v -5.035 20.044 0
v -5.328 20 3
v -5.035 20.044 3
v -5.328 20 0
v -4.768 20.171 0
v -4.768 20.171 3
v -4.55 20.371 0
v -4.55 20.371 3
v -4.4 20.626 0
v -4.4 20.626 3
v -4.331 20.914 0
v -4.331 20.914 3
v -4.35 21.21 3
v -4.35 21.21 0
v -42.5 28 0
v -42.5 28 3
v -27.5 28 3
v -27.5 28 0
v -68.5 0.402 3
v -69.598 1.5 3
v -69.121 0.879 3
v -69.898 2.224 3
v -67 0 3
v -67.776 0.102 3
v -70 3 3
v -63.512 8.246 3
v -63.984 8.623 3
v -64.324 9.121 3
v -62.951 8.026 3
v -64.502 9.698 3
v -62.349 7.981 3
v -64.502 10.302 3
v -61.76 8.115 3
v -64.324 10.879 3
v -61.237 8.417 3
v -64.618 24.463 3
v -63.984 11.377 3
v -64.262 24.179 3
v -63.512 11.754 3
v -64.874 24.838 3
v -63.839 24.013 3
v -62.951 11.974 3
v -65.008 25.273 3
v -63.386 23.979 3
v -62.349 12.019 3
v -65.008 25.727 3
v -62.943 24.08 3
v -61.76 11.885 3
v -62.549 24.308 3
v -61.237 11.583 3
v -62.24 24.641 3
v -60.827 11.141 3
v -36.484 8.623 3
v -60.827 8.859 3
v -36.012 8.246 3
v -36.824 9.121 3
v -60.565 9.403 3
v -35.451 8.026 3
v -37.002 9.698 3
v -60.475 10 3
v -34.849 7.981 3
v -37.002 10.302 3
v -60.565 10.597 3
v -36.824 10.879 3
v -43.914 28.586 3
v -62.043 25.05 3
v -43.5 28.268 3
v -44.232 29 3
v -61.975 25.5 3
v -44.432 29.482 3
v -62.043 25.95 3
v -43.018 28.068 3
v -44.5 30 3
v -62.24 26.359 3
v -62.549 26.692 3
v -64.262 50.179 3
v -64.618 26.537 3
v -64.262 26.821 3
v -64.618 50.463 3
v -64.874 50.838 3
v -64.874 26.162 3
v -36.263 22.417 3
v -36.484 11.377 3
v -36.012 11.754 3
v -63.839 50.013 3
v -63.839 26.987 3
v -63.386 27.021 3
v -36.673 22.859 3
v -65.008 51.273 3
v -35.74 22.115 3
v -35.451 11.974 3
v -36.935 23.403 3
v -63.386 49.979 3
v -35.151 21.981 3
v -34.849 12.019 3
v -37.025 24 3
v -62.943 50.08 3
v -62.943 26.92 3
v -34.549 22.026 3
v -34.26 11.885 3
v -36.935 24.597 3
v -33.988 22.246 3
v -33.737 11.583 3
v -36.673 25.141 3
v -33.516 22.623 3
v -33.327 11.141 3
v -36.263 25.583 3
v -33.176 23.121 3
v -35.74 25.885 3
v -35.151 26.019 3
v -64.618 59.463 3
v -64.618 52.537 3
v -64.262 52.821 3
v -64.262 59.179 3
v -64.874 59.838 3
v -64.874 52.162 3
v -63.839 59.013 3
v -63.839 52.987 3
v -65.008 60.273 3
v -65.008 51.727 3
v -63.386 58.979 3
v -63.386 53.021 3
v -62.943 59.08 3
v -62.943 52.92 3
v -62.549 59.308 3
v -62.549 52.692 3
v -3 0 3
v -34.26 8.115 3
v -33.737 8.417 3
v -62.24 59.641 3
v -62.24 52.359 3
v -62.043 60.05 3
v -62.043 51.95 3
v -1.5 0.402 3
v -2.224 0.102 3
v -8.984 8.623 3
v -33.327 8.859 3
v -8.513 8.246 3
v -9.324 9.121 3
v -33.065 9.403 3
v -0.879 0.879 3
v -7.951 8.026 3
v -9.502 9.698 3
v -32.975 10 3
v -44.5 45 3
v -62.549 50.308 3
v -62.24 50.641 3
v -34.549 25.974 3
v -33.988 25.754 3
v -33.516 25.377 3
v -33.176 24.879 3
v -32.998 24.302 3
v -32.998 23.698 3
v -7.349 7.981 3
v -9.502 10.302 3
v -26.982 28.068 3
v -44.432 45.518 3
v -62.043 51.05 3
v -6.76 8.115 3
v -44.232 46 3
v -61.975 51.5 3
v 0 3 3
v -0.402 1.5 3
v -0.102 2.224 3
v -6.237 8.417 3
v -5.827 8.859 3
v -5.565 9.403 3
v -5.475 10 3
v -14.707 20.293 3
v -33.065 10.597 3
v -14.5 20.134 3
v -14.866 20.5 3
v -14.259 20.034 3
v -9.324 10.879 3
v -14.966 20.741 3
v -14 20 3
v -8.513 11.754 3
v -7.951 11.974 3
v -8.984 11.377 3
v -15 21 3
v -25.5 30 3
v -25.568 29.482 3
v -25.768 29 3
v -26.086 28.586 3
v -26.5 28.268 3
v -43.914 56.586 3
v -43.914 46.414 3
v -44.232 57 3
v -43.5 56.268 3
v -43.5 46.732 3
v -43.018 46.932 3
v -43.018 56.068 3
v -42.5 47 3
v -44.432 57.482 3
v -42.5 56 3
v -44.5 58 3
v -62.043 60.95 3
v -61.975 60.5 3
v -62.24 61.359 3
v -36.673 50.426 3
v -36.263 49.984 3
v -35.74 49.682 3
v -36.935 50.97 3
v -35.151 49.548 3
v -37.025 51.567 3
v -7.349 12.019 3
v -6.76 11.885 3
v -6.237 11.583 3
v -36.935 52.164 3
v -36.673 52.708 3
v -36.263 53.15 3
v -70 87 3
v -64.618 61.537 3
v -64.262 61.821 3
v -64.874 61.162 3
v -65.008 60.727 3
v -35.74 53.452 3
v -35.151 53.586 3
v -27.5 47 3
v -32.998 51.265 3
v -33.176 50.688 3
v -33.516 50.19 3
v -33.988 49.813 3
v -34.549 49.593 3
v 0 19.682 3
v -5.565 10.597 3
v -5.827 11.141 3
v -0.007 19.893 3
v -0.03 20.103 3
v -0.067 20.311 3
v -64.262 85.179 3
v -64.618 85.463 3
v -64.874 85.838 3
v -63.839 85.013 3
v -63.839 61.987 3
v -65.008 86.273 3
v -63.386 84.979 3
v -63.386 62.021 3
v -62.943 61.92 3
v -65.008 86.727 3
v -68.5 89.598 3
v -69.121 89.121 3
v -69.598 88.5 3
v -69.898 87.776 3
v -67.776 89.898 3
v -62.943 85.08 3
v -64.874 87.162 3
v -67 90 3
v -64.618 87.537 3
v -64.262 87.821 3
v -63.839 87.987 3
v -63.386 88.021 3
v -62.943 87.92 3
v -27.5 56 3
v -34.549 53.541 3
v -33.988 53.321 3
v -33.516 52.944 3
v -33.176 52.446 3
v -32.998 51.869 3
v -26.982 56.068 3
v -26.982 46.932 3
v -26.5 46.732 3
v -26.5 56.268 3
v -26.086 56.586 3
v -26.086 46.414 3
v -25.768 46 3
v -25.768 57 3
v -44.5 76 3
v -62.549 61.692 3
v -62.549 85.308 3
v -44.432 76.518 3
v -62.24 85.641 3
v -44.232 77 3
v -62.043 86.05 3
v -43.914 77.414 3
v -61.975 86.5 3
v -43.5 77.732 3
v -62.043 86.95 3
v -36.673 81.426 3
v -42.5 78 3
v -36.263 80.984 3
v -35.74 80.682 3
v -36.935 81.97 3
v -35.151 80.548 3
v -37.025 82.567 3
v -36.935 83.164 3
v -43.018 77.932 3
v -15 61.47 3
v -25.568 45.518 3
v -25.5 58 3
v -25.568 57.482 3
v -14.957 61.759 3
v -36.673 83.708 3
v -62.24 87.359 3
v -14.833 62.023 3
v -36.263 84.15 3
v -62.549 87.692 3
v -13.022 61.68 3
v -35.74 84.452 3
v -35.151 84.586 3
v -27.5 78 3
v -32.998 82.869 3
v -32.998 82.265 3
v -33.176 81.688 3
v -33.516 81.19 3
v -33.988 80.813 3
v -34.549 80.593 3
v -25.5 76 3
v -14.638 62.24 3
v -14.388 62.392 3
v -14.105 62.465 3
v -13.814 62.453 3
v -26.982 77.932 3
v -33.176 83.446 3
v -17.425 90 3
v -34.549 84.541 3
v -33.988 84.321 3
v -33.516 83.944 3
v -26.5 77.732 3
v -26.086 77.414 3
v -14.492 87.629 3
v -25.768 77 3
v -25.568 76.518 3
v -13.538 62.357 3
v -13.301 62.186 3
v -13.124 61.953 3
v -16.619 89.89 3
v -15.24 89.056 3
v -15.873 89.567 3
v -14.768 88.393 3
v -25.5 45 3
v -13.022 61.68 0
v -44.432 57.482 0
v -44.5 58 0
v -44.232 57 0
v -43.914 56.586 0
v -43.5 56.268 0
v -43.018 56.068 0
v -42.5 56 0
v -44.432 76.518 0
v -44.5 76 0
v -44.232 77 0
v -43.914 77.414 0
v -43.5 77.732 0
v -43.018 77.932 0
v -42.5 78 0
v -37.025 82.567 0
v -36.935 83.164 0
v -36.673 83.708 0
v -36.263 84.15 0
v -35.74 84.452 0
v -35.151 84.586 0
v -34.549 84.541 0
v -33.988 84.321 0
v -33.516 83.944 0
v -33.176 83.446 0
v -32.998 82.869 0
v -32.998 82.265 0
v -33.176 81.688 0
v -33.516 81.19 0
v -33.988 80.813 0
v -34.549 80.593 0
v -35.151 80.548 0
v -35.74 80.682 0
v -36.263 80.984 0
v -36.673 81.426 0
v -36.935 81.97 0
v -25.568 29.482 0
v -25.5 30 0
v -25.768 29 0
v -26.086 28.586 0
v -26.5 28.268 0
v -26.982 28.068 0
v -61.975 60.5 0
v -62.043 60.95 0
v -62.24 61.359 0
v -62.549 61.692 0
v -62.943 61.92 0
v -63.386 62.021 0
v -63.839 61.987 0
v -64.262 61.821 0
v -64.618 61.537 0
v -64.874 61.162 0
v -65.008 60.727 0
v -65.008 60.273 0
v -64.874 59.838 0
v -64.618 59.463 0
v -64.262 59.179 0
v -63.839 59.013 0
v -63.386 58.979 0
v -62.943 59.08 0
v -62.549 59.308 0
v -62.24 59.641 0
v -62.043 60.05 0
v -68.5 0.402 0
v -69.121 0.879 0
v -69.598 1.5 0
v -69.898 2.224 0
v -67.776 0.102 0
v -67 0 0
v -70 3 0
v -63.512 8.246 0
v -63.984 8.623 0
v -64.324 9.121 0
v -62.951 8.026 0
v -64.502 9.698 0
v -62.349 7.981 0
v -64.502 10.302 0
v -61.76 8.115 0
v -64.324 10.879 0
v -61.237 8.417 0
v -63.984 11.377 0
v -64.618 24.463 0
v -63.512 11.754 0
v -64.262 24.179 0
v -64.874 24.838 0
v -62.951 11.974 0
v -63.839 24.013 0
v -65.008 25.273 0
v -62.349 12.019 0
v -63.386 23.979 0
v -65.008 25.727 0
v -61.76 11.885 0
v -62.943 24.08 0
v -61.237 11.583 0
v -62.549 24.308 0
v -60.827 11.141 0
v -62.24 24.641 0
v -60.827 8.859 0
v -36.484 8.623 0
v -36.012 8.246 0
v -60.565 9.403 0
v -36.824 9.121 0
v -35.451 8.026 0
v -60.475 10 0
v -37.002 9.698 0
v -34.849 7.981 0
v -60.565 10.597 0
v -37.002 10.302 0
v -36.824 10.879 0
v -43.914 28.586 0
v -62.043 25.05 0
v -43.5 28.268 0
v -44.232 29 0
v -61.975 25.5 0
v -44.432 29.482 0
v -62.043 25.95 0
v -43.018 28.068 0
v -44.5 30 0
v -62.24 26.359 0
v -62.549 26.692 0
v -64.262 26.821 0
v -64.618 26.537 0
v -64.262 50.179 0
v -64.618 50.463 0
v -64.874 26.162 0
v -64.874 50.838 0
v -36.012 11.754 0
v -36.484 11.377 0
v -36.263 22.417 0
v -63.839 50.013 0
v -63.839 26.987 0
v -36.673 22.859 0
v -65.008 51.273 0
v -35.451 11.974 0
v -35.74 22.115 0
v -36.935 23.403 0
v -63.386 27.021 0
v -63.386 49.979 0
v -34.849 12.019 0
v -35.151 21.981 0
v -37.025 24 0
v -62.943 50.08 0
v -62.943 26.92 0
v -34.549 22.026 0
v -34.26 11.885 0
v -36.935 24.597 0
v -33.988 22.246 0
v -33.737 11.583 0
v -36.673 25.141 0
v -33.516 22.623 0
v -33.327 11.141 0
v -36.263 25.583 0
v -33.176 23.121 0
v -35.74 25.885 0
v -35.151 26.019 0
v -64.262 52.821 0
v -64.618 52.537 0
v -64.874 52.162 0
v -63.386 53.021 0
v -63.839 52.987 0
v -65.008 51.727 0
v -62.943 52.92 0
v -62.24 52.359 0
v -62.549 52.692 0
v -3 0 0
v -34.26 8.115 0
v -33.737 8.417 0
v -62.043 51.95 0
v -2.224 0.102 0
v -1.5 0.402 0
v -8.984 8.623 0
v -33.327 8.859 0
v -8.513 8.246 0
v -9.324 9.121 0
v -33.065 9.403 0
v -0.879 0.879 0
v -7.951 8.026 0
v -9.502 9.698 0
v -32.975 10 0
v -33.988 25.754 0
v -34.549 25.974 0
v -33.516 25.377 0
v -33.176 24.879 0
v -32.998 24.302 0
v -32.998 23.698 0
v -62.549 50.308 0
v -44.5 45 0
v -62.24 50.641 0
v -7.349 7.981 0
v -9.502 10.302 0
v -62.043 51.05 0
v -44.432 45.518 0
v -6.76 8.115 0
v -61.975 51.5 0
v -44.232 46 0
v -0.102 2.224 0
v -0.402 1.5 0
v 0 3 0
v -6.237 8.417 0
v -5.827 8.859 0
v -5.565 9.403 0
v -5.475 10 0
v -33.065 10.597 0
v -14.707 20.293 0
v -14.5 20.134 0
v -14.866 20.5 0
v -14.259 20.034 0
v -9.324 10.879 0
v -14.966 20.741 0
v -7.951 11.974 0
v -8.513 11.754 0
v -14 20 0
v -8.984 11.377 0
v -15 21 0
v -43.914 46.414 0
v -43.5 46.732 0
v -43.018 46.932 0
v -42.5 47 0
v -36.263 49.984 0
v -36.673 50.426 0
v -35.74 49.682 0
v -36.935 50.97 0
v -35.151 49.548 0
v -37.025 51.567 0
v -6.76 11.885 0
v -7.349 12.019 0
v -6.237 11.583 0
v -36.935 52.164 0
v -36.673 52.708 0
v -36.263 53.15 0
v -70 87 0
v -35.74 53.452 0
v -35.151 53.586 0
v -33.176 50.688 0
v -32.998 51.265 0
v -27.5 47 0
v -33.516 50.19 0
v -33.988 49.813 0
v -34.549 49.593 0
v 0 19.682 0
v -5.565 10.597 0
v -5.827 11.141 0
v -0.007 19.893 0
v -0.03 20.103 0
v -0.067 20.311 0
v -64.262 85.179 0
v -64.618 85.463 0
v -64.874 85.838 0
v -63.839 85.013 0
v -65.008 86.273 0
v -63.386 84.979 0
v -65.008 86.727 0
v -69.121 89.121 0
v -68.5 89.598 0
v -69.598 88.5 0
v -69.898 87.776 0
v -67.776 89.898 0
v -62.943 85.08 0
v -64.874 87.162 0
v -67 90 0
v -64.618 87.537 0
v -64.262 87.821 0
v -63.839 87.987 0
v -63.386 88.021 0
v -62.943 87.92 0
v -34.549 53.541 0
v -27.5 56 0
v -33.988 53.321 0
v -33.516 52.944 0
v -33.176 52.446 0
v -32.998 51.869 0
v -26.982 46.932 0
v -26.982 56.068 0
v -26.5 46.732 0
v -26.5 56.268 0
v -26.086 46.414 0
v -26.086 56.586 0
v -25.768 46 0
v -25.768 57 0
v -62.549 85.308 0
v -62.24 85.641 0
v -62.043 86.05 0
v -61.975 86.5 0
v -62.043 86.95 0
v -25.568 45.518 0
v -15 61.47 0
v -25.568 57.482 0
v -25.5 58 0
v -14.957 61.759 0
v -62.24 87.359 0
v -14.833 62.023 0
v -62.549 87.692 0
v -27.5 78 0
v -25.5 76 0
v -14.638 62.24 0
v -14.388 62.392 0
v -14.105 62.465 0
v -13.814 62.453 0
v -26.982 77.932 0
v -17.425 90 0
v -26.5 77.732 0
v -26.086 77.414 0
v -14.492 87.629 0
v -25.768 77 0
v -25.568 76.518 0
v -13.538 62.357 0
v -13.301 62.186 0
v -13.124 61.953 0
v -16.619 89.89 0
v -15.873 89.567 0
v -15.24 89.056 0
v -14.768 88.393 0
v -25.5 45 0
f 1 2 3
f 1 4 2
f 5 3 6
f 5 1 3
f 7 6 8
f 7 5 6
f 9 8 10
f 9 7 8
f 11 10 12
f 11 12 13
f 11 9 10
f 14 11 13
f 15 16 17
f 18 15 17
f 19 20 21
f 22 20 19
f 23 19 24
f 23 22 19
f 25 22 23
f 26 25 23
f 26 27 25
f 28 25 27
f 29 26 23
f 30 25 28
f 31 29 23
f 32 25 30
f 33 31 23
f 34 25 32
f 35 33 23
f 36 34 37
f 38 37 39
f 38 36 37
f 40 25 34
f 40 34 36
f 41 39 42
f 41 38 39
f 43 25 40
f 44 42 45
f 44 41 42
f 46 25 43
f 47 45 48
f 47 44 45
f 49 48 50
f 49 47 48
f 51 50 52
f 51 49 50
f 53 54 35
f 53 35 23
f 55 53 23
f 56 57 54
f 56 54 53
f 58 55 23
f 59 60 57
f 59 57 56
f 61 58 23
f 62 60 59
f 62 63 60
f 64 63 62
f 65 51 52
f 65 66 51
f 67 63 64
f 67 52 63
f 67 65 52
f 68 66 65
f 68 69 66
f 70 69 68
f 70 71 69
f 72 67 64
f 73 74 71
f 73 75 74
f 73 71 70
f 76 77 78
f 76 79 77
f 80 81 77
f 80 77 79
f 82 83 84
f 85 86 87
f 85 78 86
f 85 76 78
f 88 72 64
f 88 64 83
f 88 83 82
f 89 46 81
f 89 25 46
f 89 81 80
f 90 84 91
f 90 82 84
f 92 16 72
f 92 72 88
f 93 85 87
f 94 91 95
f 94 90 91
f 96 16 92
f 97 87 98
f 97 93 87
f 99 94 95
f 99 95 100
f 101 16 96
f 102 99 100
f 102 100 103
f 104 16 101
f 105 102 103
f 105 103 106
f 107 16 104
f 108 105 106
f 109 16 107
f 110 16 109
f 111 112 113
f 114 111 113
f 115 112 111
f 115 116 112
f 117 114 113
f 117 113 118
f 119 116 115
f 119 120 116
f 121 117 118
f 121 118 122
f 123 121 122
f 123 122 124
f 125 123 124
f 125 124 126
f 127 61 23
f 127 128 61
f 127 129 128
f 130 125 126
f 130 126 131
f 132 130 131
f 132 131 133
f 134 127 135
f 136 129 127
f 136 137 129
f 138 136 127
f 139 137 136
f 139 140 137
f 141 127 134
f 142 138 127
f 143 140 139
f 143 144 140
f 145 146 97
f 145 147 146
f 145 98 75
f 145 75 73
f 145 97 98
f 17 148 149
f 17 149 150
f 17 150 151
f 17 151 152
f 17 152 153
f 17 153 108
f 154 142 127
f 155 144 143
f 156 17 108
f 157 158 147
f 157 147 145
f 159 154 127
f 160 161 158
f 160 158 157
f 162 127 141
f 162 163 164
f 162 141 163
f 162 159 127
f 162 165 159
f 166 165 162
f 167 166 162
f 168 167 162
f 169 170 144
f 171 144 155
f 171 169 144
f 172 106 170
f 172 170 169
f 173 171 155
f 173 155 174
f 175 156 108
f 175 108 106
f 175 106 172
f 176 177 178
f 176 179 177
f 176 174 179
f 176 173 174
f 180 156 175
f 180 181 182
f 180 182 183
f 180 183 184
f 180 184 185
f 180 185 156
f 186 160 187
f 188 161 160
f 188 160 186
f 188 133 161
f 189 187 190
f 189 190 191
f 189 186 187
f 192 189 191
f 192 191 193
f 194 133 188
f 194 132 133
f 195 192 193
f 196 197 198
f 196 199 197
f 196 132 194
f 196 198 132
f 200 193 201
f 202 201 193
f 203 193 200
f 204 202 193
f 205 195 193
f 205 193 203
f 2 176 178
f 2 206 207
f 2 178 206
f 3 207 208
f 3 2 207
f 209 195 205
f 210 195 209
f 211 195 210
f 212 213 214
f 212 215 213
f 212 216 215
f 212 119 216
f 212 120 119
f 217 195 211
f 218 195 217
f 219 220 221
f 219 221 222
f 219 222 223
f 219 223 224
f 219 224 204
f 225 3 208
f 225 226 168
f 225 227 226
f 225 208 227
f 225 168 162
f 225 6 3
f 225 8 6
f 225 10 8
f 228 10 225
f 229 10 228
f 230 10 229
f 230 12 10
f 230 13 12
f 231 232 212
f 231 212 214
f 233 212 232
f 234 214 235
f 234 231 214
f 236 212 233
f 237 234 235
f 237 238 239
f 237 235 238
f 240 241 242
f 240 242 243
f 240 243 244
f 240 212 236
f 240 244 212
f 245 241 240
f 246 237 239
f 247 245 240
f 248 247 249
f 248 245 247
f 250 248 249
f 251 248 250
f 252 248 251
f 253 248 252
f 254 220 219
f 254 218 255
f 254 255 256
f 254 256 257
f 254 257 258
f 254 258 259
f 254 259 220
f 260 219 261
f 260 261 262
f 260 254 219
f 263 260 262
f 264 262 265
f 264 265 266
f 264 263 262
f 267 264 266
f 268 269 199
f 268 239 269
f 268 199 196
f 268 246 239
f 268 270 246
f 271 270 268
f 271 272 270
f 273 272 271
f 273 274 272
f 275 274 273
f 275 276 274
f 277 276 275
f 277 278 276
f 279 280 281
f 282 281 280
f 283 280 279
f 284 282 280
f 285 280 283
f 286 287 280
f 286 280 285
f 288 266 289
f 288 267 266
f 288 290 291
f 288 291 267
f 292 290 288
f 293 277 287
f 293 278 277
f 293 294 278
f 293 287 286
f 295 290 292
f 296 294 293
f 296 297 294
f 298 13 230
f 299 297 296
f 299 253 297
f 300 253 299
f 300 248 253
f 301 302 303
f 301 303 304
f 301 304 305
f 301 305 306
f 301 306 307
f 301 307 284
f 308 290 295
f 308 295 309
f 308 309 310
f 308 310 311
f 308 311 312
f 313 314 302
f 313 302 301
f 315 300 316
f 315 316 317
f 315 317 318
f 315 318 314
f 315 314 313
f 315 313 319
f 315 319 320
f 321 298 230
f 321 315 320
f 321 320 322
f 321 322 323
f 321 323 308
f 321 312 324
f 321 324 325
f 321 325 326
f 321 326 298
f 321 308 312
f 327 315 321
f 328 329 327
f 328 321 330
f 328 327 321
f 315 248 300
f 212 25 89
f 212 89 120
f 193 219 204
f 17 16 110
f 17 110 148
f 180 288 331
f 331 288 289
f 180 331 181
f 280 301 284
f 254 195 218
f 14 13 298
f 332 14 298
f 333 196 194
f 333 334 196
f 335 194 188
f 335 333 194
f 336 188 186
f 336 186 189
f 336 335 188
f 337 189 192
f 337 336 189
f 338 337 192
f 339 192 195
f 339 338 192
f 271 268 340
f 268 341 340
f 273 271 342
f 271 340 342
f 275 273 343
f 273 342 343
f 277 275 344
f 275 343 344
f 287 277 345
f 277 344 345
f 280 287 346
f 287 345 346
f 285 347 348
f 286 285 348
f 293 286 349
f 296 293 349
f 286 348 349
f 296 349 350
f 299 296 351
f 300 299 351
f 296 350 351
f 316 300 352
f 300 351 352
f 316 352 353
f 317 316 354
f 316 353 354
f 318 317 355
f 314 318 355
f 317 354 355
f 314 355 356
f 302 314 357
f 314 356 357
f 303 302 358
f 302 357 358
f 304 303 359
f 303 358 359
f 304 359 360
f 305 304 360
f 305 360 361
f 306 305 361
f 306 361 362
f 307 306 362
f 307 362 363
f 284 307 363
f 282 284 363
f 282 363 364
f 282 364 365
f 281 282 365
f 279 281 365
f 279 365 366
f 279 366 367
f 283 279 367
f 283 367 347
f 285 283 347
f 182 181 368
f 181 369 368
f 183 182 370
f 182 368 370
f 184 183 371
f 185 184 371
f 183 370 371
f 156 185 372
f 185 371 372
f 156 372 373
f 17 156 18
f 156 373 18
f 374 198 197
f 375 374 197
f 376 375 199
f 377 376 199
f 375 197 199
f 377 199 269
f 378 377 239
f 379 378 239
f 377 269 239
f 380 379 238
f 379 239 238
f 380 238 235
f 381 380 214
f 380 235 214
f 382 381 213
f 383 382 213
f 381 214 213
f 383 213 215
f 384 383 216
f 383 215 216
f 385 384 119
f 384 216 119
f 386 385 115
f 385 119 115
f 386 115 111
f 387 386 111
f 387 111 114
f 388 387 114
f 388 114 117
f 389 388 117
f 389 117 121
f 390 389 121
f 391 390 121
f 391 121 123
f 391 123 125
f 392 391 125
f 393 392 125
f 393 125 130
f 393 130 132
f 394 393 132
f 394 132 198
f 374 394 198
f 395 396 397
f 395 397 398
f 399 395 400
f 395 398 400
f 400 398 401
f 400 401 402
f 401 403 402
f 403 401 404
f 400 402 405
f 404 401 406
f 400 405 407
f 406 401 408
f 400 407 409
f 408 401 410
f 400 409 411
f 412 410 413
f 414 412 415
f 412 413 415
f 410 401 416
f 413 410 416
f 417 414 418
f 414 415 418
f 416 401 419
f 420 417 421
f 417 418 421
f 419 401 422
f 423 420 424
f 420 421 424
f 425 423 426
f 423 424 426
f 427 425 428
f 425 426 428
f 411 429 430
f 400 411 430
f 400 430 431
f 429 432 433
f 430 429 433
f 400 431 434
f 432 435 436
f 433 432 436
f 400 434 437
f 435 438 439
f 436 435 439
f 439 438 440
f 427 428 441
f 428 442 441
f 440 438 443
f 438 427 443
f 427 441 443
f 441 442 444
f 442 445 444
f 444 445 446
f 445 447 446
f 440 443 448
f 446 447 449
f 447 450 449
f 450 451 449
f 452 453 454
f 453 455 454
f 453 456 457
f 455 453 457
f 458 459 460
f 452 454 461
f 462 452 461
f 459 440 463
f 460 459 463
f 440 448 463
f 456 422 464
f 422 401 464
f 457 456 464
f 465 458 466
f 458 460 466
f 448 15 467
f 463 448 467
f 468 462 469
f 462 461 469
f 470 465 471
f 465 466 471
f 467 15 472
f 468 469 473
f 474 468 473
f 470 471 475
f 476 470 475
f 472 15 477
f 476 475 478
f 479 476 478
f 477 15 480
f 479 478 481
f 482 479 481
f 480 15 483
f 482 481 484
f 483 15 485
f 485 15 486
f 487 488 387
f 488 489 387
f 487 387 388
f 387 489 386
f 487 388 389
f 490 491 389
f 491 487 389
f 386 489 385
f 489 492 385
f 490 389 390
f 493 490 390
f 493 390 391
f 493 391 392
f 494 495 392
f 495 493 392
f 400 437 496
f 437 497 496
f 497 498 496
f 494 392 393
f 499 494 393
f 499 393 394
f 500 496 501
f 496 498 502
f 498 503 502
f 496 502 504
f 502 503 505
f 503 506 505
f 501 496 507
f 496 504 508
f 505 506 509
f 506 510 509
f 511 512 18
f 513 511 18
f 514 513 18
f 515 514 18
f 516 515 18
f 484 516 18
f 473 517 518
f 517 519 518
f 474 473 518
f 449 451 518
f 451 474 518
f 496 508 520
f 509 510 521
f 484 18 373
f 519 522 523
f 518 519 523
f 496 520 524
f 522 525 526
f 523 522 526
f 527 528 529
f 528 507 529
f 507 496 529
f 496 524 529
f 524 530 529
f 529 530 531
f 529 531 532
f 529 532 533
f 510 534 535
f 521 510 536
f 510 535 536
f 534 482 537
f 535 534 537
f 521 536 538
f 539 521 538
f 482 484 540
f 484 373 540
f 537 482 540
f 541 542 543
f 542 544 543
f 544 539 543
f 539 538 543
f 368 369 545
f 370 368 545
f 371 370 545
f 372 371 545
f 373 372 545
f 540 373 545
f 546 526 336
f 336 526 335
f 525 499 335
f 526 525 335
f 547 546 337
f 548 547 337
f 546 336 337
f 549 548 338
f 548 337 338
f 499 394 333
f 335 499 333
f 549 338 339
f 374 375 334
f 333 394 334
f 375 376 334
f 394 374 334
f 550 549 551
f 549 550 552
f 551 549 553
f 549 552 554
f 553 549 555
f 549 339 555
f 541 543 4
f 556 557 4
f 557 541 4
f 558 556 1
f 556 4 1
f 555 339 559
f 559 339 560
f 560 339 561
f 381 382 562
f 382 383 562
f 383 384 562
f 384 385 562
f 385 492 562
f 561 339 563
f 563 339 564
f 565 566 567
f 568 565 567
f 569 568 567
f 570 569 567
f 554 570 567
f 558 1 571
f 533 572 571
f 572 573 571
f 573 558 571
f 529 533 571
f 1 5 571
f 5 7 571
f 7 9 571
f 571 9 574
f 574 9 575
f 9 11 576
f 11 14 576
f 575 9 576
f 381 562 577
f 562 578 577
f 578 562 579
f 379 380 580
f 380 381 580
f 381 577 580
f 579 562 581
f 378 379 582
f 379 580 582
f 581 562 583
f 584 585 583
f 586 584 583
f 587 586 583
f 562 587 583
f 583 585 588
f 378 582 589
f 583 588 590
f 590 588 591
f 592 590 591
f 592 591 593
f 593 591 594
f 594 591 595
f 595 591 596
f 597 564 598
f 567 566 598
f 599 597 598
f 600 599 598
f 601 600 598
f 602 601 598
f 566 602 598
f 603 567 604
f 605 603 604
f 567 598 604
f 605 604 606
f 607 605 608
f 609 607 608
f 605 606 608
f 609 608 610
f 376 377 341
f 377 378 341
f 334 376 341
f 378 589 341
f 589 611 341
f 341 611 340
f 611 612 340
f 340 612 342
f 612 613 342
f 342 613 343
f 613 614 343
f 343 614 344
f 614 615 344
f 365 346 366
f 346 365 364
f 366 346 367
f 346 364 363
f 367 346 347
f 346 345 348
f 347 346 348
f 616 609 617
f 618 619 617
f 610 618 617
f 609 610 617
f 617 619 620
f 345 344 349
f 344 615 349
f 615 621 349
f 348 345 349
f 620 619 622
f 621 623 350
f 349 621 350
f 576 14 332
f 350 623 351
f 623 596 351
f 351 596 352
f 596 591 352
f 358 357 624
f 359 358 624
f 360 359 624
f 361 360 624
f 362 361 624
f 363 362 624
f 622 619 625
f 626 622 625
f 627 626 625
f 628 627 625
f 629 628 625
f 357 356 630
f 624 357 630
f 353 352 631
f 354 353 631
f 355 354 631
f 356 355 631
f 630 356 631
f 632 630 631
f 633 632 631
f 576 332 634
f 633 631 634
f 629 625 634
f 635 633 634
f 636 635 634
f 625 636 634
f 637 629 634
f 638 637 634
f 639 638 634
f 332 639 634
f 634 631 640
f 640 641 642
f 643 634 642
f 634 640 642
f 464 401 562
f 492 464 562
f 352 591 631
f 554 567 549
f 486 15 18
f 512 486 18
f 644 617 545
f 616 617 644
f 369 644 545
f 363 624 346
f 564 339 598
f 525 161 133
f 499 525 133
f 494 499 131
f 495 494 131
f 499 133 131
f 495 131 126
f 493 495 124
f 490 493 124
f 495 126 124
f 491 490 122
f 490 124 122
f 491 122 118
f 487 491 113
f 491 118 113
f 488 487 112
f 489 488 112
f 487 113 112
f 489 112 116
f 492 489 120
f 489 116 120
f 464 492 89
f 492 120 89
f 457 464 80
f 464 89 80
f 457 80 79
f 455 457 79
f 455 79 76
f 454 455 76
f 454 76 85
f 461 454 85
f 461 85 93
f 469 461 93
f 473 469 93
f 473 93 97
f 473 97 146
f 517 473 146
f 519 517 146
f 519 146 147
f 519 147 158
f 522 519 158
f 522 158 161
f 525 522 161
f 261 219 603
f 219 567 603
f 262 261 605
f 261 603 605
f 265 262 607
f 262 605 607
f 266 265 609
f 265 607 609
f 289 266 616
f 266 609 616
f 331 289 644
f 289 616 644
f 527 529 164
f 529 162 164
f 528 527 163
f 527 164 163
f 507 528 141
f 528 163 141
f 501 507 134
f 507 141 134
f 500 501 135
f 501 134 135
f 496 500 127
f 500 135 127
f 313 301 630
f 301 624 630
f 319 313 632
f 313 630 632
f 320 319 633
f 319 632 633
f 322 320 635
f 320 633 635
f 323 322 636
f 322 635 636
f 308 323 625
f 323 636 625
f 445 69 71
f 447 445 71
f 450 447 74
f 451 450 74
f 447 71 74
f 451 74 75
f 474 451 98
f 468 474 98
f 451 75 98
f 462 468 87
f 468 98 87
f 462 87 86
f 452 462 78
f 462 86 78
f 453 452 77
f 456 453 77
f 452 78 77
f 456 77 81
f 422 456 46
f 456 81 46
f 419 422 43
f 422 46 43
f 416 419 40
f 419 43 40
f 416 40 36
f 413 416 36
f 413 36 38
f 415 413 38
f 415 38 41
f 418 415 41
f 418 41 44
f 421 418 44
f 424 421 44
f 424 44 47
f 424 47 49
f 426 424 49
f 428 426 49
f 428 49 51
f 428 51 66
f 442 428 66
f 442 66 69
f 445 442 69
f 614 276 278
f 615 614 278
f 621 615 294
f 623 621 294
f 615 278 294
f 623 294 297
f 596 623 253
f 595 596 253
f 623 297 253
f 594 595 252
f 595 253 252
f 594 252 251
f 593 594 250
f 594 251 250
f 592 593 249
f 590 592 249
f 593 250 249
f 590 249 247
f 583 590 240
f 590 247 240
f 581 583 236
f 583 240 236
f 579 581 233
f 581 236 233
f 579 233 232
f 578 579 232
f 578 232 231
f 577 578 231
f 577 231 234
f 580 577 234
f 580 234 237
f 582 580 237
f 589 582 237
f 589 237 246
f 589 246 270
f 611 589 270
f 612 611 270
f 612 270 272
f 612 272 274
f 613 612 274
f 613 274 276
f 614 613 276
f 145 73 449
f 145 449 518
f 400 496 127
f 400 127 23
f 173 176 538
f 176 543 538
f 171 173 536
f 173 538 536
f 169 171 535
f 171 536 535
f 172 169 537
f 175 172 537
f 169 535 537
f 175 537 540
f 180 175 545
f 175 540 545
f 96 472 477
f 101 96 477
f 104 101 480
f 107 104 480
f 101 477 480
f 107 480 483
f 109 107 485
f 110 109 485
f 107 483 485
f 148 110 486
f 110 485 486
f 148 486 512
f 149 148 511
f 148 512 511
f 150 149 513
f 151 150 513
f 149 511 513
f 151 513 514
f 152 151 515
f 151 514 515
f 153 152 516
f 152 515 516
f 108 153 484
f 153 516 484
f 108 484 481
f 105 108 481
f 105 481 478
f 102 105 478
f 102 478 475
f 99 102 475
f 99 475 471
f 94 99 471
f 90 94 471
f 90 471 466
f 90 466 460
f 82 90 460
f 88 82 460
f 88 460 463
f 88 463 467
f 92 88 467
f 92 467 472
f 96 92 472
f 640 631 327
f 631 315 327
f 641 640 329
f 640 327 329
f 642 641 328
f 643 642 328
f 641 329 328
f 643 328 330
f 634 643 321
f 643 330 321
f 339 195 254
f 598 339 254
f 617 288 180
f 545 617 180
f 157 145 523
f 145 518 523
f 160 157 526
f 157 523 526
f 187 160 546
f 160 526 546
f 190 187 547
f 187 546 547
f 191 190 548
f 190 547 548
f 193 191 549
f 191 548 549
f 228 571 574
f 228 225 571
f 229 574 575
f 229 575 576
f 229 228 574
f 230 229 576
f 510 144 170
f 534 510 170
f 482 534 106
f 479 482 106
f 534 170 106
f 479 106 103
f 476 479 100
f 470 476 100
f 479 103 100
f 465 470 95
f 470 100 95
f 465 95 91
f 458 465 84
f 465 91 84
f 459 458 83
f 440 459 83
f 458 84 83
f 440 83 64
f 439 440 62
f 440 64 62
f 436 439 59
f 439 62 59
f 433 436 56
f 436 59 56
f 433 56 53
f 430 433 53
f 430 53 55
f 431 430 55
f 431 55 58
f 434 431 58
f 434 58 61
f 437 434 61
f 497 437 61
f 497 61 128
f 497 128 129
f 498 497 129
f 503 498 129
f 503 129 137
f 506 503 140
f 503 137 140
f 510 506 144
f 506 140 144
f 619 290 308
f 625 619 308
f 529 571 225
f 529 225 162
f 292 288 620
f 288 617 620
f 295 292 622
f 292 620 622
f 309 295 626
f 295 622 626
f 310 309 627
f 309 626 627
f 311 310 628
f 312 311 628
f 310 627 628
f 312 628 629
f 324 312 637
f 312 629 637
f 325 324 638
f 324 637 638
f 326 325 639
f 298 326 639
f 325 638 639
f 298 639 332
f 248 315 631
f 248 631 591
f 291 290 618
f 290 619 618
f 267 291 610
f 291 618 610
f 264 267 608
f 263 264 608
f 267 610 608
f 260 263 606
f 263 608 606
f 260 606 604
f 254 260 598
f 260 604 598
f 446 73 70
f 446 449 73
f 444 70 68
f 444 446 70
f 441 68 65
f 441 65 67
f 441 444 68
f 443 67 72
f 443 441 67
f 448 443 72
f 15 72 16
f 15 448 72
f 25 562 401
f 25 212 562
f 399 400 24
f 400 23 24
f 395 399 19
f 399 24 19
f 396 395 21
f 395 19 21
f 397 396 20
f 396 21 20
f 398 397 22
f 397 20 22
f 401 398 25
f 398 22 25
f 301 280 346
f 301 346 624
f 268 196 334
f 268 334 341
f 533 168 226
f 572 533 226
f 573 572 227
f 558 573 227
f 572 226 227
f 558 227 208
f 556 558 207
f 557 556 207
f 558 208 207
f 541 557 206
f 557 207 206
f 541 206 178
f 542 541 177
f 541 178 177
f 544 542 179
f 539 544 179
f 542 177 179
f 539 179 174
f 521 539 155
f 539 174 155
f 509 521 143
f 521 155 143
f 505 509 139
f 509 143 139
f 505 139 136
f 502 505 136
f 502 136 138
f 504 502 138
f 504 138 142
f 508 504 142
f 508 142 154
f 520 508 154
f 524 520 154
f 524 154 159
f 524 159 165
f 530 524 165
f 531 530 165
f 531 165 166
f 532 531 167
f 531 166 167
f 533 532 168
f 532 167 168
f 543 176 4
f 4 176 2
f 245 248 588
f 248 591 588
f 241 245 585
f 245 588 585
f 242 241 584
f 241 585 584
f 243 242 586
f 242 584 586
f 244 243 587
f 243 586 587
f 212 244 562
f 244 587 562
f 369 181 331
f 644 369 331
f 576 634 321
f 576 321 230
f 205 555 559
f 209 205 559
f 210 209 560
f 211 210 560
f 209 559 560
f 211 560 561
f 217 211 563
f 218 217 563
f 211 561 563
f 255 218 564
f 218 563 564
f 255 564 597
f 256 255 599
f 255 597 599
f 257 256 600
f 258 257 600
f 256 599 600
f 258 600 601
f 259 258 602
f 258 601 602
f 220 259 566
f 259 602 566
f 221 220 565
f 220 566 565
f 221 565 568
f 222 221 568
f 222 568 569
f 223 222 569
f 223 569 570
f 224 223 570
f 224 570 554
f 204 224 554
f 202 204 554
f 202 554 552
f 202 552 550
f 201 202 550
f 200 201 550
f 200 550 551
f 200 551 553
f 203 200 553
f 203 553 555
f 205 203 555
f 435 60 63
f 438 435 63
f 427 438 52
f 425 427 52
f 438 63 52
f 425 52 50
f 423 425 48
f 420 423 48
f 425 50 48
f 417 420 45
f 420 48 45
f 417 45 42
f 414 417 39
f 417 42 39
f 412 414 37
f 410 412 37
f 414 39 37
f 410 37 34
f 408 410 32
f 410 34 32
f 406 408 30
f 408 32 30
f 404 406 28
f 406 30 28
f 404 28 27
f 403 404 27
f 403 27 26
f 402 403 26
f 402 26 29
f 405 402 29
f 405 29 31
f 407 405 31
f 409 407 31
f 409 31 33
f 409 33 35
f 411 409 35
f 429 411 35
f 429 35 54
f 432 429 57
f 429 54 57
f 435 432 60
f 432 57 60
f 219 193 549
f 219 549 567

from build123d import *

# Parameters (mm, degrees)
EXTRUDE_1_DEPTH          = 3
SKETCH_3_W               = 19
SKETCH_3_H               = 22
SKETCH_3_H_2             = 19
CUT_EXTRUDE_1_DEPTH      = 3
FILLET_1_R               = 1
FILLET_2_R               = 2
SKETCH_4_R               = 2.025
CUT_EXTRUDE_2_DEPTH      = 3
SKETCH_5_R               = 2.025
CUT_EXTRUDE_3_DEPTH      = 10
EXTRUDE_2_DEPTH          = 3
FILLET_3_R               = 3
SKETCH_8_R               = 1.525
CUT_EXTRUDE_4_DEPTH      = 1
CUT_EXTRUDE_4_DEPTH_BACK = 4


with BuildPart() as part:
    # 草图1 → 凸台-拉伸1 (new body)
    with BuildSketch(Plane.XY):
        Polygon((0, 0), (-70, 0), (-70, 20), (-55, 90), (-15, 90), (0, 20), align=None)
    extrude(amount=EXTRUDE_1_DEPTH)

    # 草图3 → 切除-拉伸1 (cut)
    with BuildSketch(Plane.XY.offset(3)):
        with Locations((-35, 67)):
            Rectangle(SKETCH_3_W, SKETCH_3_H)
        with Locations((-35, 37.5)):
            Rectangle(SKETCH_3_W, SKETCH_3_H_2)
        Polygon((-4.090806018, 20), (-15, 70.909571916), (-15, 20), align=None)
    extrude(amount=-CUT_EXTRUDE_1_DEPTH, mode=Mode.SUBTRACT)

    # 圆角1
    fillet_1_edges = [part.edges().sort_by_distance(p)[0] for p in [
        (-4.090806018, 20, 1.5),
        (-15, 20, 1.5),
        (-15, 70.909571916, 1.5),
    ]]
    fillet(fillet_1_edges, radius=FILLET_1_R)

    # 圆角2
    fillet_2_edges = [part.edges().sort_by_distance(p)[0] for p in [
        (-25.5, 47, 1.5),
        (-25.5, 28, 1.5),
        (-44.5, 28, 1.5),
        (-44.5, 47, 1.5),
        (-25.5, 78, 1.5),
        (-25.5, 56, 1.5),
        (-44.5, 56, 1.5),
        (-44.5, 78, 1.5),
    ]]
    fillet(fillet_2_edges, radius=FILLET_2_R)

    # 草图4 → 切除-拉伸2 (cut)
    with BuildSketch(Plane.XY.offset(3)):
        with Locations((-62.5, 10)):
            Circle(SKETCH_4_R)
        with Locations((-35, 10)):
            Circle(SKETCH_4_R)
        with Locations((-7.5, 10)):
            Circle(SKETCH_4_R)
    extrude(amount=-CUT_EXTRUDE_2_DEPTH, mode=Mode.SUBTRACT)

    # 草图5 → 切除-拉伸3 (cut)
    with BuildSketch(Plane(origin=(0, 0, 0), x_dir=(-1, 0, 0), z_dir=(0, 0, -1))):
        with Locations((35, 82.566965626)):
            Circle(SKETCH_5_R)
        with Locations((35, 51.566965626)):
            Circle(SKETCH_5_R)
        with Locations((35, 24)):
            Circle(SKETCH_5_R)
    extrude(amount=-CUT_EXTRUDE_3_DEPTH, mode=Mode.SUBTRACT)

    # 草图7 → 凸台-拉伸2 (add)
    with BuildSketch(Plane.XY.offset(3)):
        Polygon((-55, 90), (-70, 90), (-70, 20), align=None)
    extrude(amount=-EXTRUDE_2_DEPTH)

    # 圆角3
    fillet_3_edges = [part.edges().sort_by_distance(p)[0] for p in [
        (0, 0, 1.5),
        (-70, 0, 1.5),
        (-15, 90, 1.5),
        (0, 20, 1.5),
        (-70, 90, 1.5),
    ]]
    fillet(fillet_3_edges, radius=FILLET_3_R)

    # 草图8 → 切除-拉伸4 (cut, two sides)
    with BuildSketch(Plane.XY.offset(3)) as cut_extrude_4_sk:
        with Locations((-63.5, 86.5)):
            Circle(SKETCH_8_R)
        with Locations((-63.5, 60.5)):
            Circle(SKETCH_8_R)
        with Locations((-63.5, 51.5)):
            Circle(SKETCH_8_R)
        with Locations((-63.5, 25.5)):
            Circle(SKETCH_8_R)
    extrude(amount=CUT_EXTRUDE_4_DEPTH, mode=Mode.SUBTRACT)
    extrude(cut_extrude_4_sk.sketch, amount=-CUT_EXTRUDE_4_DEPTH_BACK, mode=Mode.SUBTRACT)


solid = part.part
